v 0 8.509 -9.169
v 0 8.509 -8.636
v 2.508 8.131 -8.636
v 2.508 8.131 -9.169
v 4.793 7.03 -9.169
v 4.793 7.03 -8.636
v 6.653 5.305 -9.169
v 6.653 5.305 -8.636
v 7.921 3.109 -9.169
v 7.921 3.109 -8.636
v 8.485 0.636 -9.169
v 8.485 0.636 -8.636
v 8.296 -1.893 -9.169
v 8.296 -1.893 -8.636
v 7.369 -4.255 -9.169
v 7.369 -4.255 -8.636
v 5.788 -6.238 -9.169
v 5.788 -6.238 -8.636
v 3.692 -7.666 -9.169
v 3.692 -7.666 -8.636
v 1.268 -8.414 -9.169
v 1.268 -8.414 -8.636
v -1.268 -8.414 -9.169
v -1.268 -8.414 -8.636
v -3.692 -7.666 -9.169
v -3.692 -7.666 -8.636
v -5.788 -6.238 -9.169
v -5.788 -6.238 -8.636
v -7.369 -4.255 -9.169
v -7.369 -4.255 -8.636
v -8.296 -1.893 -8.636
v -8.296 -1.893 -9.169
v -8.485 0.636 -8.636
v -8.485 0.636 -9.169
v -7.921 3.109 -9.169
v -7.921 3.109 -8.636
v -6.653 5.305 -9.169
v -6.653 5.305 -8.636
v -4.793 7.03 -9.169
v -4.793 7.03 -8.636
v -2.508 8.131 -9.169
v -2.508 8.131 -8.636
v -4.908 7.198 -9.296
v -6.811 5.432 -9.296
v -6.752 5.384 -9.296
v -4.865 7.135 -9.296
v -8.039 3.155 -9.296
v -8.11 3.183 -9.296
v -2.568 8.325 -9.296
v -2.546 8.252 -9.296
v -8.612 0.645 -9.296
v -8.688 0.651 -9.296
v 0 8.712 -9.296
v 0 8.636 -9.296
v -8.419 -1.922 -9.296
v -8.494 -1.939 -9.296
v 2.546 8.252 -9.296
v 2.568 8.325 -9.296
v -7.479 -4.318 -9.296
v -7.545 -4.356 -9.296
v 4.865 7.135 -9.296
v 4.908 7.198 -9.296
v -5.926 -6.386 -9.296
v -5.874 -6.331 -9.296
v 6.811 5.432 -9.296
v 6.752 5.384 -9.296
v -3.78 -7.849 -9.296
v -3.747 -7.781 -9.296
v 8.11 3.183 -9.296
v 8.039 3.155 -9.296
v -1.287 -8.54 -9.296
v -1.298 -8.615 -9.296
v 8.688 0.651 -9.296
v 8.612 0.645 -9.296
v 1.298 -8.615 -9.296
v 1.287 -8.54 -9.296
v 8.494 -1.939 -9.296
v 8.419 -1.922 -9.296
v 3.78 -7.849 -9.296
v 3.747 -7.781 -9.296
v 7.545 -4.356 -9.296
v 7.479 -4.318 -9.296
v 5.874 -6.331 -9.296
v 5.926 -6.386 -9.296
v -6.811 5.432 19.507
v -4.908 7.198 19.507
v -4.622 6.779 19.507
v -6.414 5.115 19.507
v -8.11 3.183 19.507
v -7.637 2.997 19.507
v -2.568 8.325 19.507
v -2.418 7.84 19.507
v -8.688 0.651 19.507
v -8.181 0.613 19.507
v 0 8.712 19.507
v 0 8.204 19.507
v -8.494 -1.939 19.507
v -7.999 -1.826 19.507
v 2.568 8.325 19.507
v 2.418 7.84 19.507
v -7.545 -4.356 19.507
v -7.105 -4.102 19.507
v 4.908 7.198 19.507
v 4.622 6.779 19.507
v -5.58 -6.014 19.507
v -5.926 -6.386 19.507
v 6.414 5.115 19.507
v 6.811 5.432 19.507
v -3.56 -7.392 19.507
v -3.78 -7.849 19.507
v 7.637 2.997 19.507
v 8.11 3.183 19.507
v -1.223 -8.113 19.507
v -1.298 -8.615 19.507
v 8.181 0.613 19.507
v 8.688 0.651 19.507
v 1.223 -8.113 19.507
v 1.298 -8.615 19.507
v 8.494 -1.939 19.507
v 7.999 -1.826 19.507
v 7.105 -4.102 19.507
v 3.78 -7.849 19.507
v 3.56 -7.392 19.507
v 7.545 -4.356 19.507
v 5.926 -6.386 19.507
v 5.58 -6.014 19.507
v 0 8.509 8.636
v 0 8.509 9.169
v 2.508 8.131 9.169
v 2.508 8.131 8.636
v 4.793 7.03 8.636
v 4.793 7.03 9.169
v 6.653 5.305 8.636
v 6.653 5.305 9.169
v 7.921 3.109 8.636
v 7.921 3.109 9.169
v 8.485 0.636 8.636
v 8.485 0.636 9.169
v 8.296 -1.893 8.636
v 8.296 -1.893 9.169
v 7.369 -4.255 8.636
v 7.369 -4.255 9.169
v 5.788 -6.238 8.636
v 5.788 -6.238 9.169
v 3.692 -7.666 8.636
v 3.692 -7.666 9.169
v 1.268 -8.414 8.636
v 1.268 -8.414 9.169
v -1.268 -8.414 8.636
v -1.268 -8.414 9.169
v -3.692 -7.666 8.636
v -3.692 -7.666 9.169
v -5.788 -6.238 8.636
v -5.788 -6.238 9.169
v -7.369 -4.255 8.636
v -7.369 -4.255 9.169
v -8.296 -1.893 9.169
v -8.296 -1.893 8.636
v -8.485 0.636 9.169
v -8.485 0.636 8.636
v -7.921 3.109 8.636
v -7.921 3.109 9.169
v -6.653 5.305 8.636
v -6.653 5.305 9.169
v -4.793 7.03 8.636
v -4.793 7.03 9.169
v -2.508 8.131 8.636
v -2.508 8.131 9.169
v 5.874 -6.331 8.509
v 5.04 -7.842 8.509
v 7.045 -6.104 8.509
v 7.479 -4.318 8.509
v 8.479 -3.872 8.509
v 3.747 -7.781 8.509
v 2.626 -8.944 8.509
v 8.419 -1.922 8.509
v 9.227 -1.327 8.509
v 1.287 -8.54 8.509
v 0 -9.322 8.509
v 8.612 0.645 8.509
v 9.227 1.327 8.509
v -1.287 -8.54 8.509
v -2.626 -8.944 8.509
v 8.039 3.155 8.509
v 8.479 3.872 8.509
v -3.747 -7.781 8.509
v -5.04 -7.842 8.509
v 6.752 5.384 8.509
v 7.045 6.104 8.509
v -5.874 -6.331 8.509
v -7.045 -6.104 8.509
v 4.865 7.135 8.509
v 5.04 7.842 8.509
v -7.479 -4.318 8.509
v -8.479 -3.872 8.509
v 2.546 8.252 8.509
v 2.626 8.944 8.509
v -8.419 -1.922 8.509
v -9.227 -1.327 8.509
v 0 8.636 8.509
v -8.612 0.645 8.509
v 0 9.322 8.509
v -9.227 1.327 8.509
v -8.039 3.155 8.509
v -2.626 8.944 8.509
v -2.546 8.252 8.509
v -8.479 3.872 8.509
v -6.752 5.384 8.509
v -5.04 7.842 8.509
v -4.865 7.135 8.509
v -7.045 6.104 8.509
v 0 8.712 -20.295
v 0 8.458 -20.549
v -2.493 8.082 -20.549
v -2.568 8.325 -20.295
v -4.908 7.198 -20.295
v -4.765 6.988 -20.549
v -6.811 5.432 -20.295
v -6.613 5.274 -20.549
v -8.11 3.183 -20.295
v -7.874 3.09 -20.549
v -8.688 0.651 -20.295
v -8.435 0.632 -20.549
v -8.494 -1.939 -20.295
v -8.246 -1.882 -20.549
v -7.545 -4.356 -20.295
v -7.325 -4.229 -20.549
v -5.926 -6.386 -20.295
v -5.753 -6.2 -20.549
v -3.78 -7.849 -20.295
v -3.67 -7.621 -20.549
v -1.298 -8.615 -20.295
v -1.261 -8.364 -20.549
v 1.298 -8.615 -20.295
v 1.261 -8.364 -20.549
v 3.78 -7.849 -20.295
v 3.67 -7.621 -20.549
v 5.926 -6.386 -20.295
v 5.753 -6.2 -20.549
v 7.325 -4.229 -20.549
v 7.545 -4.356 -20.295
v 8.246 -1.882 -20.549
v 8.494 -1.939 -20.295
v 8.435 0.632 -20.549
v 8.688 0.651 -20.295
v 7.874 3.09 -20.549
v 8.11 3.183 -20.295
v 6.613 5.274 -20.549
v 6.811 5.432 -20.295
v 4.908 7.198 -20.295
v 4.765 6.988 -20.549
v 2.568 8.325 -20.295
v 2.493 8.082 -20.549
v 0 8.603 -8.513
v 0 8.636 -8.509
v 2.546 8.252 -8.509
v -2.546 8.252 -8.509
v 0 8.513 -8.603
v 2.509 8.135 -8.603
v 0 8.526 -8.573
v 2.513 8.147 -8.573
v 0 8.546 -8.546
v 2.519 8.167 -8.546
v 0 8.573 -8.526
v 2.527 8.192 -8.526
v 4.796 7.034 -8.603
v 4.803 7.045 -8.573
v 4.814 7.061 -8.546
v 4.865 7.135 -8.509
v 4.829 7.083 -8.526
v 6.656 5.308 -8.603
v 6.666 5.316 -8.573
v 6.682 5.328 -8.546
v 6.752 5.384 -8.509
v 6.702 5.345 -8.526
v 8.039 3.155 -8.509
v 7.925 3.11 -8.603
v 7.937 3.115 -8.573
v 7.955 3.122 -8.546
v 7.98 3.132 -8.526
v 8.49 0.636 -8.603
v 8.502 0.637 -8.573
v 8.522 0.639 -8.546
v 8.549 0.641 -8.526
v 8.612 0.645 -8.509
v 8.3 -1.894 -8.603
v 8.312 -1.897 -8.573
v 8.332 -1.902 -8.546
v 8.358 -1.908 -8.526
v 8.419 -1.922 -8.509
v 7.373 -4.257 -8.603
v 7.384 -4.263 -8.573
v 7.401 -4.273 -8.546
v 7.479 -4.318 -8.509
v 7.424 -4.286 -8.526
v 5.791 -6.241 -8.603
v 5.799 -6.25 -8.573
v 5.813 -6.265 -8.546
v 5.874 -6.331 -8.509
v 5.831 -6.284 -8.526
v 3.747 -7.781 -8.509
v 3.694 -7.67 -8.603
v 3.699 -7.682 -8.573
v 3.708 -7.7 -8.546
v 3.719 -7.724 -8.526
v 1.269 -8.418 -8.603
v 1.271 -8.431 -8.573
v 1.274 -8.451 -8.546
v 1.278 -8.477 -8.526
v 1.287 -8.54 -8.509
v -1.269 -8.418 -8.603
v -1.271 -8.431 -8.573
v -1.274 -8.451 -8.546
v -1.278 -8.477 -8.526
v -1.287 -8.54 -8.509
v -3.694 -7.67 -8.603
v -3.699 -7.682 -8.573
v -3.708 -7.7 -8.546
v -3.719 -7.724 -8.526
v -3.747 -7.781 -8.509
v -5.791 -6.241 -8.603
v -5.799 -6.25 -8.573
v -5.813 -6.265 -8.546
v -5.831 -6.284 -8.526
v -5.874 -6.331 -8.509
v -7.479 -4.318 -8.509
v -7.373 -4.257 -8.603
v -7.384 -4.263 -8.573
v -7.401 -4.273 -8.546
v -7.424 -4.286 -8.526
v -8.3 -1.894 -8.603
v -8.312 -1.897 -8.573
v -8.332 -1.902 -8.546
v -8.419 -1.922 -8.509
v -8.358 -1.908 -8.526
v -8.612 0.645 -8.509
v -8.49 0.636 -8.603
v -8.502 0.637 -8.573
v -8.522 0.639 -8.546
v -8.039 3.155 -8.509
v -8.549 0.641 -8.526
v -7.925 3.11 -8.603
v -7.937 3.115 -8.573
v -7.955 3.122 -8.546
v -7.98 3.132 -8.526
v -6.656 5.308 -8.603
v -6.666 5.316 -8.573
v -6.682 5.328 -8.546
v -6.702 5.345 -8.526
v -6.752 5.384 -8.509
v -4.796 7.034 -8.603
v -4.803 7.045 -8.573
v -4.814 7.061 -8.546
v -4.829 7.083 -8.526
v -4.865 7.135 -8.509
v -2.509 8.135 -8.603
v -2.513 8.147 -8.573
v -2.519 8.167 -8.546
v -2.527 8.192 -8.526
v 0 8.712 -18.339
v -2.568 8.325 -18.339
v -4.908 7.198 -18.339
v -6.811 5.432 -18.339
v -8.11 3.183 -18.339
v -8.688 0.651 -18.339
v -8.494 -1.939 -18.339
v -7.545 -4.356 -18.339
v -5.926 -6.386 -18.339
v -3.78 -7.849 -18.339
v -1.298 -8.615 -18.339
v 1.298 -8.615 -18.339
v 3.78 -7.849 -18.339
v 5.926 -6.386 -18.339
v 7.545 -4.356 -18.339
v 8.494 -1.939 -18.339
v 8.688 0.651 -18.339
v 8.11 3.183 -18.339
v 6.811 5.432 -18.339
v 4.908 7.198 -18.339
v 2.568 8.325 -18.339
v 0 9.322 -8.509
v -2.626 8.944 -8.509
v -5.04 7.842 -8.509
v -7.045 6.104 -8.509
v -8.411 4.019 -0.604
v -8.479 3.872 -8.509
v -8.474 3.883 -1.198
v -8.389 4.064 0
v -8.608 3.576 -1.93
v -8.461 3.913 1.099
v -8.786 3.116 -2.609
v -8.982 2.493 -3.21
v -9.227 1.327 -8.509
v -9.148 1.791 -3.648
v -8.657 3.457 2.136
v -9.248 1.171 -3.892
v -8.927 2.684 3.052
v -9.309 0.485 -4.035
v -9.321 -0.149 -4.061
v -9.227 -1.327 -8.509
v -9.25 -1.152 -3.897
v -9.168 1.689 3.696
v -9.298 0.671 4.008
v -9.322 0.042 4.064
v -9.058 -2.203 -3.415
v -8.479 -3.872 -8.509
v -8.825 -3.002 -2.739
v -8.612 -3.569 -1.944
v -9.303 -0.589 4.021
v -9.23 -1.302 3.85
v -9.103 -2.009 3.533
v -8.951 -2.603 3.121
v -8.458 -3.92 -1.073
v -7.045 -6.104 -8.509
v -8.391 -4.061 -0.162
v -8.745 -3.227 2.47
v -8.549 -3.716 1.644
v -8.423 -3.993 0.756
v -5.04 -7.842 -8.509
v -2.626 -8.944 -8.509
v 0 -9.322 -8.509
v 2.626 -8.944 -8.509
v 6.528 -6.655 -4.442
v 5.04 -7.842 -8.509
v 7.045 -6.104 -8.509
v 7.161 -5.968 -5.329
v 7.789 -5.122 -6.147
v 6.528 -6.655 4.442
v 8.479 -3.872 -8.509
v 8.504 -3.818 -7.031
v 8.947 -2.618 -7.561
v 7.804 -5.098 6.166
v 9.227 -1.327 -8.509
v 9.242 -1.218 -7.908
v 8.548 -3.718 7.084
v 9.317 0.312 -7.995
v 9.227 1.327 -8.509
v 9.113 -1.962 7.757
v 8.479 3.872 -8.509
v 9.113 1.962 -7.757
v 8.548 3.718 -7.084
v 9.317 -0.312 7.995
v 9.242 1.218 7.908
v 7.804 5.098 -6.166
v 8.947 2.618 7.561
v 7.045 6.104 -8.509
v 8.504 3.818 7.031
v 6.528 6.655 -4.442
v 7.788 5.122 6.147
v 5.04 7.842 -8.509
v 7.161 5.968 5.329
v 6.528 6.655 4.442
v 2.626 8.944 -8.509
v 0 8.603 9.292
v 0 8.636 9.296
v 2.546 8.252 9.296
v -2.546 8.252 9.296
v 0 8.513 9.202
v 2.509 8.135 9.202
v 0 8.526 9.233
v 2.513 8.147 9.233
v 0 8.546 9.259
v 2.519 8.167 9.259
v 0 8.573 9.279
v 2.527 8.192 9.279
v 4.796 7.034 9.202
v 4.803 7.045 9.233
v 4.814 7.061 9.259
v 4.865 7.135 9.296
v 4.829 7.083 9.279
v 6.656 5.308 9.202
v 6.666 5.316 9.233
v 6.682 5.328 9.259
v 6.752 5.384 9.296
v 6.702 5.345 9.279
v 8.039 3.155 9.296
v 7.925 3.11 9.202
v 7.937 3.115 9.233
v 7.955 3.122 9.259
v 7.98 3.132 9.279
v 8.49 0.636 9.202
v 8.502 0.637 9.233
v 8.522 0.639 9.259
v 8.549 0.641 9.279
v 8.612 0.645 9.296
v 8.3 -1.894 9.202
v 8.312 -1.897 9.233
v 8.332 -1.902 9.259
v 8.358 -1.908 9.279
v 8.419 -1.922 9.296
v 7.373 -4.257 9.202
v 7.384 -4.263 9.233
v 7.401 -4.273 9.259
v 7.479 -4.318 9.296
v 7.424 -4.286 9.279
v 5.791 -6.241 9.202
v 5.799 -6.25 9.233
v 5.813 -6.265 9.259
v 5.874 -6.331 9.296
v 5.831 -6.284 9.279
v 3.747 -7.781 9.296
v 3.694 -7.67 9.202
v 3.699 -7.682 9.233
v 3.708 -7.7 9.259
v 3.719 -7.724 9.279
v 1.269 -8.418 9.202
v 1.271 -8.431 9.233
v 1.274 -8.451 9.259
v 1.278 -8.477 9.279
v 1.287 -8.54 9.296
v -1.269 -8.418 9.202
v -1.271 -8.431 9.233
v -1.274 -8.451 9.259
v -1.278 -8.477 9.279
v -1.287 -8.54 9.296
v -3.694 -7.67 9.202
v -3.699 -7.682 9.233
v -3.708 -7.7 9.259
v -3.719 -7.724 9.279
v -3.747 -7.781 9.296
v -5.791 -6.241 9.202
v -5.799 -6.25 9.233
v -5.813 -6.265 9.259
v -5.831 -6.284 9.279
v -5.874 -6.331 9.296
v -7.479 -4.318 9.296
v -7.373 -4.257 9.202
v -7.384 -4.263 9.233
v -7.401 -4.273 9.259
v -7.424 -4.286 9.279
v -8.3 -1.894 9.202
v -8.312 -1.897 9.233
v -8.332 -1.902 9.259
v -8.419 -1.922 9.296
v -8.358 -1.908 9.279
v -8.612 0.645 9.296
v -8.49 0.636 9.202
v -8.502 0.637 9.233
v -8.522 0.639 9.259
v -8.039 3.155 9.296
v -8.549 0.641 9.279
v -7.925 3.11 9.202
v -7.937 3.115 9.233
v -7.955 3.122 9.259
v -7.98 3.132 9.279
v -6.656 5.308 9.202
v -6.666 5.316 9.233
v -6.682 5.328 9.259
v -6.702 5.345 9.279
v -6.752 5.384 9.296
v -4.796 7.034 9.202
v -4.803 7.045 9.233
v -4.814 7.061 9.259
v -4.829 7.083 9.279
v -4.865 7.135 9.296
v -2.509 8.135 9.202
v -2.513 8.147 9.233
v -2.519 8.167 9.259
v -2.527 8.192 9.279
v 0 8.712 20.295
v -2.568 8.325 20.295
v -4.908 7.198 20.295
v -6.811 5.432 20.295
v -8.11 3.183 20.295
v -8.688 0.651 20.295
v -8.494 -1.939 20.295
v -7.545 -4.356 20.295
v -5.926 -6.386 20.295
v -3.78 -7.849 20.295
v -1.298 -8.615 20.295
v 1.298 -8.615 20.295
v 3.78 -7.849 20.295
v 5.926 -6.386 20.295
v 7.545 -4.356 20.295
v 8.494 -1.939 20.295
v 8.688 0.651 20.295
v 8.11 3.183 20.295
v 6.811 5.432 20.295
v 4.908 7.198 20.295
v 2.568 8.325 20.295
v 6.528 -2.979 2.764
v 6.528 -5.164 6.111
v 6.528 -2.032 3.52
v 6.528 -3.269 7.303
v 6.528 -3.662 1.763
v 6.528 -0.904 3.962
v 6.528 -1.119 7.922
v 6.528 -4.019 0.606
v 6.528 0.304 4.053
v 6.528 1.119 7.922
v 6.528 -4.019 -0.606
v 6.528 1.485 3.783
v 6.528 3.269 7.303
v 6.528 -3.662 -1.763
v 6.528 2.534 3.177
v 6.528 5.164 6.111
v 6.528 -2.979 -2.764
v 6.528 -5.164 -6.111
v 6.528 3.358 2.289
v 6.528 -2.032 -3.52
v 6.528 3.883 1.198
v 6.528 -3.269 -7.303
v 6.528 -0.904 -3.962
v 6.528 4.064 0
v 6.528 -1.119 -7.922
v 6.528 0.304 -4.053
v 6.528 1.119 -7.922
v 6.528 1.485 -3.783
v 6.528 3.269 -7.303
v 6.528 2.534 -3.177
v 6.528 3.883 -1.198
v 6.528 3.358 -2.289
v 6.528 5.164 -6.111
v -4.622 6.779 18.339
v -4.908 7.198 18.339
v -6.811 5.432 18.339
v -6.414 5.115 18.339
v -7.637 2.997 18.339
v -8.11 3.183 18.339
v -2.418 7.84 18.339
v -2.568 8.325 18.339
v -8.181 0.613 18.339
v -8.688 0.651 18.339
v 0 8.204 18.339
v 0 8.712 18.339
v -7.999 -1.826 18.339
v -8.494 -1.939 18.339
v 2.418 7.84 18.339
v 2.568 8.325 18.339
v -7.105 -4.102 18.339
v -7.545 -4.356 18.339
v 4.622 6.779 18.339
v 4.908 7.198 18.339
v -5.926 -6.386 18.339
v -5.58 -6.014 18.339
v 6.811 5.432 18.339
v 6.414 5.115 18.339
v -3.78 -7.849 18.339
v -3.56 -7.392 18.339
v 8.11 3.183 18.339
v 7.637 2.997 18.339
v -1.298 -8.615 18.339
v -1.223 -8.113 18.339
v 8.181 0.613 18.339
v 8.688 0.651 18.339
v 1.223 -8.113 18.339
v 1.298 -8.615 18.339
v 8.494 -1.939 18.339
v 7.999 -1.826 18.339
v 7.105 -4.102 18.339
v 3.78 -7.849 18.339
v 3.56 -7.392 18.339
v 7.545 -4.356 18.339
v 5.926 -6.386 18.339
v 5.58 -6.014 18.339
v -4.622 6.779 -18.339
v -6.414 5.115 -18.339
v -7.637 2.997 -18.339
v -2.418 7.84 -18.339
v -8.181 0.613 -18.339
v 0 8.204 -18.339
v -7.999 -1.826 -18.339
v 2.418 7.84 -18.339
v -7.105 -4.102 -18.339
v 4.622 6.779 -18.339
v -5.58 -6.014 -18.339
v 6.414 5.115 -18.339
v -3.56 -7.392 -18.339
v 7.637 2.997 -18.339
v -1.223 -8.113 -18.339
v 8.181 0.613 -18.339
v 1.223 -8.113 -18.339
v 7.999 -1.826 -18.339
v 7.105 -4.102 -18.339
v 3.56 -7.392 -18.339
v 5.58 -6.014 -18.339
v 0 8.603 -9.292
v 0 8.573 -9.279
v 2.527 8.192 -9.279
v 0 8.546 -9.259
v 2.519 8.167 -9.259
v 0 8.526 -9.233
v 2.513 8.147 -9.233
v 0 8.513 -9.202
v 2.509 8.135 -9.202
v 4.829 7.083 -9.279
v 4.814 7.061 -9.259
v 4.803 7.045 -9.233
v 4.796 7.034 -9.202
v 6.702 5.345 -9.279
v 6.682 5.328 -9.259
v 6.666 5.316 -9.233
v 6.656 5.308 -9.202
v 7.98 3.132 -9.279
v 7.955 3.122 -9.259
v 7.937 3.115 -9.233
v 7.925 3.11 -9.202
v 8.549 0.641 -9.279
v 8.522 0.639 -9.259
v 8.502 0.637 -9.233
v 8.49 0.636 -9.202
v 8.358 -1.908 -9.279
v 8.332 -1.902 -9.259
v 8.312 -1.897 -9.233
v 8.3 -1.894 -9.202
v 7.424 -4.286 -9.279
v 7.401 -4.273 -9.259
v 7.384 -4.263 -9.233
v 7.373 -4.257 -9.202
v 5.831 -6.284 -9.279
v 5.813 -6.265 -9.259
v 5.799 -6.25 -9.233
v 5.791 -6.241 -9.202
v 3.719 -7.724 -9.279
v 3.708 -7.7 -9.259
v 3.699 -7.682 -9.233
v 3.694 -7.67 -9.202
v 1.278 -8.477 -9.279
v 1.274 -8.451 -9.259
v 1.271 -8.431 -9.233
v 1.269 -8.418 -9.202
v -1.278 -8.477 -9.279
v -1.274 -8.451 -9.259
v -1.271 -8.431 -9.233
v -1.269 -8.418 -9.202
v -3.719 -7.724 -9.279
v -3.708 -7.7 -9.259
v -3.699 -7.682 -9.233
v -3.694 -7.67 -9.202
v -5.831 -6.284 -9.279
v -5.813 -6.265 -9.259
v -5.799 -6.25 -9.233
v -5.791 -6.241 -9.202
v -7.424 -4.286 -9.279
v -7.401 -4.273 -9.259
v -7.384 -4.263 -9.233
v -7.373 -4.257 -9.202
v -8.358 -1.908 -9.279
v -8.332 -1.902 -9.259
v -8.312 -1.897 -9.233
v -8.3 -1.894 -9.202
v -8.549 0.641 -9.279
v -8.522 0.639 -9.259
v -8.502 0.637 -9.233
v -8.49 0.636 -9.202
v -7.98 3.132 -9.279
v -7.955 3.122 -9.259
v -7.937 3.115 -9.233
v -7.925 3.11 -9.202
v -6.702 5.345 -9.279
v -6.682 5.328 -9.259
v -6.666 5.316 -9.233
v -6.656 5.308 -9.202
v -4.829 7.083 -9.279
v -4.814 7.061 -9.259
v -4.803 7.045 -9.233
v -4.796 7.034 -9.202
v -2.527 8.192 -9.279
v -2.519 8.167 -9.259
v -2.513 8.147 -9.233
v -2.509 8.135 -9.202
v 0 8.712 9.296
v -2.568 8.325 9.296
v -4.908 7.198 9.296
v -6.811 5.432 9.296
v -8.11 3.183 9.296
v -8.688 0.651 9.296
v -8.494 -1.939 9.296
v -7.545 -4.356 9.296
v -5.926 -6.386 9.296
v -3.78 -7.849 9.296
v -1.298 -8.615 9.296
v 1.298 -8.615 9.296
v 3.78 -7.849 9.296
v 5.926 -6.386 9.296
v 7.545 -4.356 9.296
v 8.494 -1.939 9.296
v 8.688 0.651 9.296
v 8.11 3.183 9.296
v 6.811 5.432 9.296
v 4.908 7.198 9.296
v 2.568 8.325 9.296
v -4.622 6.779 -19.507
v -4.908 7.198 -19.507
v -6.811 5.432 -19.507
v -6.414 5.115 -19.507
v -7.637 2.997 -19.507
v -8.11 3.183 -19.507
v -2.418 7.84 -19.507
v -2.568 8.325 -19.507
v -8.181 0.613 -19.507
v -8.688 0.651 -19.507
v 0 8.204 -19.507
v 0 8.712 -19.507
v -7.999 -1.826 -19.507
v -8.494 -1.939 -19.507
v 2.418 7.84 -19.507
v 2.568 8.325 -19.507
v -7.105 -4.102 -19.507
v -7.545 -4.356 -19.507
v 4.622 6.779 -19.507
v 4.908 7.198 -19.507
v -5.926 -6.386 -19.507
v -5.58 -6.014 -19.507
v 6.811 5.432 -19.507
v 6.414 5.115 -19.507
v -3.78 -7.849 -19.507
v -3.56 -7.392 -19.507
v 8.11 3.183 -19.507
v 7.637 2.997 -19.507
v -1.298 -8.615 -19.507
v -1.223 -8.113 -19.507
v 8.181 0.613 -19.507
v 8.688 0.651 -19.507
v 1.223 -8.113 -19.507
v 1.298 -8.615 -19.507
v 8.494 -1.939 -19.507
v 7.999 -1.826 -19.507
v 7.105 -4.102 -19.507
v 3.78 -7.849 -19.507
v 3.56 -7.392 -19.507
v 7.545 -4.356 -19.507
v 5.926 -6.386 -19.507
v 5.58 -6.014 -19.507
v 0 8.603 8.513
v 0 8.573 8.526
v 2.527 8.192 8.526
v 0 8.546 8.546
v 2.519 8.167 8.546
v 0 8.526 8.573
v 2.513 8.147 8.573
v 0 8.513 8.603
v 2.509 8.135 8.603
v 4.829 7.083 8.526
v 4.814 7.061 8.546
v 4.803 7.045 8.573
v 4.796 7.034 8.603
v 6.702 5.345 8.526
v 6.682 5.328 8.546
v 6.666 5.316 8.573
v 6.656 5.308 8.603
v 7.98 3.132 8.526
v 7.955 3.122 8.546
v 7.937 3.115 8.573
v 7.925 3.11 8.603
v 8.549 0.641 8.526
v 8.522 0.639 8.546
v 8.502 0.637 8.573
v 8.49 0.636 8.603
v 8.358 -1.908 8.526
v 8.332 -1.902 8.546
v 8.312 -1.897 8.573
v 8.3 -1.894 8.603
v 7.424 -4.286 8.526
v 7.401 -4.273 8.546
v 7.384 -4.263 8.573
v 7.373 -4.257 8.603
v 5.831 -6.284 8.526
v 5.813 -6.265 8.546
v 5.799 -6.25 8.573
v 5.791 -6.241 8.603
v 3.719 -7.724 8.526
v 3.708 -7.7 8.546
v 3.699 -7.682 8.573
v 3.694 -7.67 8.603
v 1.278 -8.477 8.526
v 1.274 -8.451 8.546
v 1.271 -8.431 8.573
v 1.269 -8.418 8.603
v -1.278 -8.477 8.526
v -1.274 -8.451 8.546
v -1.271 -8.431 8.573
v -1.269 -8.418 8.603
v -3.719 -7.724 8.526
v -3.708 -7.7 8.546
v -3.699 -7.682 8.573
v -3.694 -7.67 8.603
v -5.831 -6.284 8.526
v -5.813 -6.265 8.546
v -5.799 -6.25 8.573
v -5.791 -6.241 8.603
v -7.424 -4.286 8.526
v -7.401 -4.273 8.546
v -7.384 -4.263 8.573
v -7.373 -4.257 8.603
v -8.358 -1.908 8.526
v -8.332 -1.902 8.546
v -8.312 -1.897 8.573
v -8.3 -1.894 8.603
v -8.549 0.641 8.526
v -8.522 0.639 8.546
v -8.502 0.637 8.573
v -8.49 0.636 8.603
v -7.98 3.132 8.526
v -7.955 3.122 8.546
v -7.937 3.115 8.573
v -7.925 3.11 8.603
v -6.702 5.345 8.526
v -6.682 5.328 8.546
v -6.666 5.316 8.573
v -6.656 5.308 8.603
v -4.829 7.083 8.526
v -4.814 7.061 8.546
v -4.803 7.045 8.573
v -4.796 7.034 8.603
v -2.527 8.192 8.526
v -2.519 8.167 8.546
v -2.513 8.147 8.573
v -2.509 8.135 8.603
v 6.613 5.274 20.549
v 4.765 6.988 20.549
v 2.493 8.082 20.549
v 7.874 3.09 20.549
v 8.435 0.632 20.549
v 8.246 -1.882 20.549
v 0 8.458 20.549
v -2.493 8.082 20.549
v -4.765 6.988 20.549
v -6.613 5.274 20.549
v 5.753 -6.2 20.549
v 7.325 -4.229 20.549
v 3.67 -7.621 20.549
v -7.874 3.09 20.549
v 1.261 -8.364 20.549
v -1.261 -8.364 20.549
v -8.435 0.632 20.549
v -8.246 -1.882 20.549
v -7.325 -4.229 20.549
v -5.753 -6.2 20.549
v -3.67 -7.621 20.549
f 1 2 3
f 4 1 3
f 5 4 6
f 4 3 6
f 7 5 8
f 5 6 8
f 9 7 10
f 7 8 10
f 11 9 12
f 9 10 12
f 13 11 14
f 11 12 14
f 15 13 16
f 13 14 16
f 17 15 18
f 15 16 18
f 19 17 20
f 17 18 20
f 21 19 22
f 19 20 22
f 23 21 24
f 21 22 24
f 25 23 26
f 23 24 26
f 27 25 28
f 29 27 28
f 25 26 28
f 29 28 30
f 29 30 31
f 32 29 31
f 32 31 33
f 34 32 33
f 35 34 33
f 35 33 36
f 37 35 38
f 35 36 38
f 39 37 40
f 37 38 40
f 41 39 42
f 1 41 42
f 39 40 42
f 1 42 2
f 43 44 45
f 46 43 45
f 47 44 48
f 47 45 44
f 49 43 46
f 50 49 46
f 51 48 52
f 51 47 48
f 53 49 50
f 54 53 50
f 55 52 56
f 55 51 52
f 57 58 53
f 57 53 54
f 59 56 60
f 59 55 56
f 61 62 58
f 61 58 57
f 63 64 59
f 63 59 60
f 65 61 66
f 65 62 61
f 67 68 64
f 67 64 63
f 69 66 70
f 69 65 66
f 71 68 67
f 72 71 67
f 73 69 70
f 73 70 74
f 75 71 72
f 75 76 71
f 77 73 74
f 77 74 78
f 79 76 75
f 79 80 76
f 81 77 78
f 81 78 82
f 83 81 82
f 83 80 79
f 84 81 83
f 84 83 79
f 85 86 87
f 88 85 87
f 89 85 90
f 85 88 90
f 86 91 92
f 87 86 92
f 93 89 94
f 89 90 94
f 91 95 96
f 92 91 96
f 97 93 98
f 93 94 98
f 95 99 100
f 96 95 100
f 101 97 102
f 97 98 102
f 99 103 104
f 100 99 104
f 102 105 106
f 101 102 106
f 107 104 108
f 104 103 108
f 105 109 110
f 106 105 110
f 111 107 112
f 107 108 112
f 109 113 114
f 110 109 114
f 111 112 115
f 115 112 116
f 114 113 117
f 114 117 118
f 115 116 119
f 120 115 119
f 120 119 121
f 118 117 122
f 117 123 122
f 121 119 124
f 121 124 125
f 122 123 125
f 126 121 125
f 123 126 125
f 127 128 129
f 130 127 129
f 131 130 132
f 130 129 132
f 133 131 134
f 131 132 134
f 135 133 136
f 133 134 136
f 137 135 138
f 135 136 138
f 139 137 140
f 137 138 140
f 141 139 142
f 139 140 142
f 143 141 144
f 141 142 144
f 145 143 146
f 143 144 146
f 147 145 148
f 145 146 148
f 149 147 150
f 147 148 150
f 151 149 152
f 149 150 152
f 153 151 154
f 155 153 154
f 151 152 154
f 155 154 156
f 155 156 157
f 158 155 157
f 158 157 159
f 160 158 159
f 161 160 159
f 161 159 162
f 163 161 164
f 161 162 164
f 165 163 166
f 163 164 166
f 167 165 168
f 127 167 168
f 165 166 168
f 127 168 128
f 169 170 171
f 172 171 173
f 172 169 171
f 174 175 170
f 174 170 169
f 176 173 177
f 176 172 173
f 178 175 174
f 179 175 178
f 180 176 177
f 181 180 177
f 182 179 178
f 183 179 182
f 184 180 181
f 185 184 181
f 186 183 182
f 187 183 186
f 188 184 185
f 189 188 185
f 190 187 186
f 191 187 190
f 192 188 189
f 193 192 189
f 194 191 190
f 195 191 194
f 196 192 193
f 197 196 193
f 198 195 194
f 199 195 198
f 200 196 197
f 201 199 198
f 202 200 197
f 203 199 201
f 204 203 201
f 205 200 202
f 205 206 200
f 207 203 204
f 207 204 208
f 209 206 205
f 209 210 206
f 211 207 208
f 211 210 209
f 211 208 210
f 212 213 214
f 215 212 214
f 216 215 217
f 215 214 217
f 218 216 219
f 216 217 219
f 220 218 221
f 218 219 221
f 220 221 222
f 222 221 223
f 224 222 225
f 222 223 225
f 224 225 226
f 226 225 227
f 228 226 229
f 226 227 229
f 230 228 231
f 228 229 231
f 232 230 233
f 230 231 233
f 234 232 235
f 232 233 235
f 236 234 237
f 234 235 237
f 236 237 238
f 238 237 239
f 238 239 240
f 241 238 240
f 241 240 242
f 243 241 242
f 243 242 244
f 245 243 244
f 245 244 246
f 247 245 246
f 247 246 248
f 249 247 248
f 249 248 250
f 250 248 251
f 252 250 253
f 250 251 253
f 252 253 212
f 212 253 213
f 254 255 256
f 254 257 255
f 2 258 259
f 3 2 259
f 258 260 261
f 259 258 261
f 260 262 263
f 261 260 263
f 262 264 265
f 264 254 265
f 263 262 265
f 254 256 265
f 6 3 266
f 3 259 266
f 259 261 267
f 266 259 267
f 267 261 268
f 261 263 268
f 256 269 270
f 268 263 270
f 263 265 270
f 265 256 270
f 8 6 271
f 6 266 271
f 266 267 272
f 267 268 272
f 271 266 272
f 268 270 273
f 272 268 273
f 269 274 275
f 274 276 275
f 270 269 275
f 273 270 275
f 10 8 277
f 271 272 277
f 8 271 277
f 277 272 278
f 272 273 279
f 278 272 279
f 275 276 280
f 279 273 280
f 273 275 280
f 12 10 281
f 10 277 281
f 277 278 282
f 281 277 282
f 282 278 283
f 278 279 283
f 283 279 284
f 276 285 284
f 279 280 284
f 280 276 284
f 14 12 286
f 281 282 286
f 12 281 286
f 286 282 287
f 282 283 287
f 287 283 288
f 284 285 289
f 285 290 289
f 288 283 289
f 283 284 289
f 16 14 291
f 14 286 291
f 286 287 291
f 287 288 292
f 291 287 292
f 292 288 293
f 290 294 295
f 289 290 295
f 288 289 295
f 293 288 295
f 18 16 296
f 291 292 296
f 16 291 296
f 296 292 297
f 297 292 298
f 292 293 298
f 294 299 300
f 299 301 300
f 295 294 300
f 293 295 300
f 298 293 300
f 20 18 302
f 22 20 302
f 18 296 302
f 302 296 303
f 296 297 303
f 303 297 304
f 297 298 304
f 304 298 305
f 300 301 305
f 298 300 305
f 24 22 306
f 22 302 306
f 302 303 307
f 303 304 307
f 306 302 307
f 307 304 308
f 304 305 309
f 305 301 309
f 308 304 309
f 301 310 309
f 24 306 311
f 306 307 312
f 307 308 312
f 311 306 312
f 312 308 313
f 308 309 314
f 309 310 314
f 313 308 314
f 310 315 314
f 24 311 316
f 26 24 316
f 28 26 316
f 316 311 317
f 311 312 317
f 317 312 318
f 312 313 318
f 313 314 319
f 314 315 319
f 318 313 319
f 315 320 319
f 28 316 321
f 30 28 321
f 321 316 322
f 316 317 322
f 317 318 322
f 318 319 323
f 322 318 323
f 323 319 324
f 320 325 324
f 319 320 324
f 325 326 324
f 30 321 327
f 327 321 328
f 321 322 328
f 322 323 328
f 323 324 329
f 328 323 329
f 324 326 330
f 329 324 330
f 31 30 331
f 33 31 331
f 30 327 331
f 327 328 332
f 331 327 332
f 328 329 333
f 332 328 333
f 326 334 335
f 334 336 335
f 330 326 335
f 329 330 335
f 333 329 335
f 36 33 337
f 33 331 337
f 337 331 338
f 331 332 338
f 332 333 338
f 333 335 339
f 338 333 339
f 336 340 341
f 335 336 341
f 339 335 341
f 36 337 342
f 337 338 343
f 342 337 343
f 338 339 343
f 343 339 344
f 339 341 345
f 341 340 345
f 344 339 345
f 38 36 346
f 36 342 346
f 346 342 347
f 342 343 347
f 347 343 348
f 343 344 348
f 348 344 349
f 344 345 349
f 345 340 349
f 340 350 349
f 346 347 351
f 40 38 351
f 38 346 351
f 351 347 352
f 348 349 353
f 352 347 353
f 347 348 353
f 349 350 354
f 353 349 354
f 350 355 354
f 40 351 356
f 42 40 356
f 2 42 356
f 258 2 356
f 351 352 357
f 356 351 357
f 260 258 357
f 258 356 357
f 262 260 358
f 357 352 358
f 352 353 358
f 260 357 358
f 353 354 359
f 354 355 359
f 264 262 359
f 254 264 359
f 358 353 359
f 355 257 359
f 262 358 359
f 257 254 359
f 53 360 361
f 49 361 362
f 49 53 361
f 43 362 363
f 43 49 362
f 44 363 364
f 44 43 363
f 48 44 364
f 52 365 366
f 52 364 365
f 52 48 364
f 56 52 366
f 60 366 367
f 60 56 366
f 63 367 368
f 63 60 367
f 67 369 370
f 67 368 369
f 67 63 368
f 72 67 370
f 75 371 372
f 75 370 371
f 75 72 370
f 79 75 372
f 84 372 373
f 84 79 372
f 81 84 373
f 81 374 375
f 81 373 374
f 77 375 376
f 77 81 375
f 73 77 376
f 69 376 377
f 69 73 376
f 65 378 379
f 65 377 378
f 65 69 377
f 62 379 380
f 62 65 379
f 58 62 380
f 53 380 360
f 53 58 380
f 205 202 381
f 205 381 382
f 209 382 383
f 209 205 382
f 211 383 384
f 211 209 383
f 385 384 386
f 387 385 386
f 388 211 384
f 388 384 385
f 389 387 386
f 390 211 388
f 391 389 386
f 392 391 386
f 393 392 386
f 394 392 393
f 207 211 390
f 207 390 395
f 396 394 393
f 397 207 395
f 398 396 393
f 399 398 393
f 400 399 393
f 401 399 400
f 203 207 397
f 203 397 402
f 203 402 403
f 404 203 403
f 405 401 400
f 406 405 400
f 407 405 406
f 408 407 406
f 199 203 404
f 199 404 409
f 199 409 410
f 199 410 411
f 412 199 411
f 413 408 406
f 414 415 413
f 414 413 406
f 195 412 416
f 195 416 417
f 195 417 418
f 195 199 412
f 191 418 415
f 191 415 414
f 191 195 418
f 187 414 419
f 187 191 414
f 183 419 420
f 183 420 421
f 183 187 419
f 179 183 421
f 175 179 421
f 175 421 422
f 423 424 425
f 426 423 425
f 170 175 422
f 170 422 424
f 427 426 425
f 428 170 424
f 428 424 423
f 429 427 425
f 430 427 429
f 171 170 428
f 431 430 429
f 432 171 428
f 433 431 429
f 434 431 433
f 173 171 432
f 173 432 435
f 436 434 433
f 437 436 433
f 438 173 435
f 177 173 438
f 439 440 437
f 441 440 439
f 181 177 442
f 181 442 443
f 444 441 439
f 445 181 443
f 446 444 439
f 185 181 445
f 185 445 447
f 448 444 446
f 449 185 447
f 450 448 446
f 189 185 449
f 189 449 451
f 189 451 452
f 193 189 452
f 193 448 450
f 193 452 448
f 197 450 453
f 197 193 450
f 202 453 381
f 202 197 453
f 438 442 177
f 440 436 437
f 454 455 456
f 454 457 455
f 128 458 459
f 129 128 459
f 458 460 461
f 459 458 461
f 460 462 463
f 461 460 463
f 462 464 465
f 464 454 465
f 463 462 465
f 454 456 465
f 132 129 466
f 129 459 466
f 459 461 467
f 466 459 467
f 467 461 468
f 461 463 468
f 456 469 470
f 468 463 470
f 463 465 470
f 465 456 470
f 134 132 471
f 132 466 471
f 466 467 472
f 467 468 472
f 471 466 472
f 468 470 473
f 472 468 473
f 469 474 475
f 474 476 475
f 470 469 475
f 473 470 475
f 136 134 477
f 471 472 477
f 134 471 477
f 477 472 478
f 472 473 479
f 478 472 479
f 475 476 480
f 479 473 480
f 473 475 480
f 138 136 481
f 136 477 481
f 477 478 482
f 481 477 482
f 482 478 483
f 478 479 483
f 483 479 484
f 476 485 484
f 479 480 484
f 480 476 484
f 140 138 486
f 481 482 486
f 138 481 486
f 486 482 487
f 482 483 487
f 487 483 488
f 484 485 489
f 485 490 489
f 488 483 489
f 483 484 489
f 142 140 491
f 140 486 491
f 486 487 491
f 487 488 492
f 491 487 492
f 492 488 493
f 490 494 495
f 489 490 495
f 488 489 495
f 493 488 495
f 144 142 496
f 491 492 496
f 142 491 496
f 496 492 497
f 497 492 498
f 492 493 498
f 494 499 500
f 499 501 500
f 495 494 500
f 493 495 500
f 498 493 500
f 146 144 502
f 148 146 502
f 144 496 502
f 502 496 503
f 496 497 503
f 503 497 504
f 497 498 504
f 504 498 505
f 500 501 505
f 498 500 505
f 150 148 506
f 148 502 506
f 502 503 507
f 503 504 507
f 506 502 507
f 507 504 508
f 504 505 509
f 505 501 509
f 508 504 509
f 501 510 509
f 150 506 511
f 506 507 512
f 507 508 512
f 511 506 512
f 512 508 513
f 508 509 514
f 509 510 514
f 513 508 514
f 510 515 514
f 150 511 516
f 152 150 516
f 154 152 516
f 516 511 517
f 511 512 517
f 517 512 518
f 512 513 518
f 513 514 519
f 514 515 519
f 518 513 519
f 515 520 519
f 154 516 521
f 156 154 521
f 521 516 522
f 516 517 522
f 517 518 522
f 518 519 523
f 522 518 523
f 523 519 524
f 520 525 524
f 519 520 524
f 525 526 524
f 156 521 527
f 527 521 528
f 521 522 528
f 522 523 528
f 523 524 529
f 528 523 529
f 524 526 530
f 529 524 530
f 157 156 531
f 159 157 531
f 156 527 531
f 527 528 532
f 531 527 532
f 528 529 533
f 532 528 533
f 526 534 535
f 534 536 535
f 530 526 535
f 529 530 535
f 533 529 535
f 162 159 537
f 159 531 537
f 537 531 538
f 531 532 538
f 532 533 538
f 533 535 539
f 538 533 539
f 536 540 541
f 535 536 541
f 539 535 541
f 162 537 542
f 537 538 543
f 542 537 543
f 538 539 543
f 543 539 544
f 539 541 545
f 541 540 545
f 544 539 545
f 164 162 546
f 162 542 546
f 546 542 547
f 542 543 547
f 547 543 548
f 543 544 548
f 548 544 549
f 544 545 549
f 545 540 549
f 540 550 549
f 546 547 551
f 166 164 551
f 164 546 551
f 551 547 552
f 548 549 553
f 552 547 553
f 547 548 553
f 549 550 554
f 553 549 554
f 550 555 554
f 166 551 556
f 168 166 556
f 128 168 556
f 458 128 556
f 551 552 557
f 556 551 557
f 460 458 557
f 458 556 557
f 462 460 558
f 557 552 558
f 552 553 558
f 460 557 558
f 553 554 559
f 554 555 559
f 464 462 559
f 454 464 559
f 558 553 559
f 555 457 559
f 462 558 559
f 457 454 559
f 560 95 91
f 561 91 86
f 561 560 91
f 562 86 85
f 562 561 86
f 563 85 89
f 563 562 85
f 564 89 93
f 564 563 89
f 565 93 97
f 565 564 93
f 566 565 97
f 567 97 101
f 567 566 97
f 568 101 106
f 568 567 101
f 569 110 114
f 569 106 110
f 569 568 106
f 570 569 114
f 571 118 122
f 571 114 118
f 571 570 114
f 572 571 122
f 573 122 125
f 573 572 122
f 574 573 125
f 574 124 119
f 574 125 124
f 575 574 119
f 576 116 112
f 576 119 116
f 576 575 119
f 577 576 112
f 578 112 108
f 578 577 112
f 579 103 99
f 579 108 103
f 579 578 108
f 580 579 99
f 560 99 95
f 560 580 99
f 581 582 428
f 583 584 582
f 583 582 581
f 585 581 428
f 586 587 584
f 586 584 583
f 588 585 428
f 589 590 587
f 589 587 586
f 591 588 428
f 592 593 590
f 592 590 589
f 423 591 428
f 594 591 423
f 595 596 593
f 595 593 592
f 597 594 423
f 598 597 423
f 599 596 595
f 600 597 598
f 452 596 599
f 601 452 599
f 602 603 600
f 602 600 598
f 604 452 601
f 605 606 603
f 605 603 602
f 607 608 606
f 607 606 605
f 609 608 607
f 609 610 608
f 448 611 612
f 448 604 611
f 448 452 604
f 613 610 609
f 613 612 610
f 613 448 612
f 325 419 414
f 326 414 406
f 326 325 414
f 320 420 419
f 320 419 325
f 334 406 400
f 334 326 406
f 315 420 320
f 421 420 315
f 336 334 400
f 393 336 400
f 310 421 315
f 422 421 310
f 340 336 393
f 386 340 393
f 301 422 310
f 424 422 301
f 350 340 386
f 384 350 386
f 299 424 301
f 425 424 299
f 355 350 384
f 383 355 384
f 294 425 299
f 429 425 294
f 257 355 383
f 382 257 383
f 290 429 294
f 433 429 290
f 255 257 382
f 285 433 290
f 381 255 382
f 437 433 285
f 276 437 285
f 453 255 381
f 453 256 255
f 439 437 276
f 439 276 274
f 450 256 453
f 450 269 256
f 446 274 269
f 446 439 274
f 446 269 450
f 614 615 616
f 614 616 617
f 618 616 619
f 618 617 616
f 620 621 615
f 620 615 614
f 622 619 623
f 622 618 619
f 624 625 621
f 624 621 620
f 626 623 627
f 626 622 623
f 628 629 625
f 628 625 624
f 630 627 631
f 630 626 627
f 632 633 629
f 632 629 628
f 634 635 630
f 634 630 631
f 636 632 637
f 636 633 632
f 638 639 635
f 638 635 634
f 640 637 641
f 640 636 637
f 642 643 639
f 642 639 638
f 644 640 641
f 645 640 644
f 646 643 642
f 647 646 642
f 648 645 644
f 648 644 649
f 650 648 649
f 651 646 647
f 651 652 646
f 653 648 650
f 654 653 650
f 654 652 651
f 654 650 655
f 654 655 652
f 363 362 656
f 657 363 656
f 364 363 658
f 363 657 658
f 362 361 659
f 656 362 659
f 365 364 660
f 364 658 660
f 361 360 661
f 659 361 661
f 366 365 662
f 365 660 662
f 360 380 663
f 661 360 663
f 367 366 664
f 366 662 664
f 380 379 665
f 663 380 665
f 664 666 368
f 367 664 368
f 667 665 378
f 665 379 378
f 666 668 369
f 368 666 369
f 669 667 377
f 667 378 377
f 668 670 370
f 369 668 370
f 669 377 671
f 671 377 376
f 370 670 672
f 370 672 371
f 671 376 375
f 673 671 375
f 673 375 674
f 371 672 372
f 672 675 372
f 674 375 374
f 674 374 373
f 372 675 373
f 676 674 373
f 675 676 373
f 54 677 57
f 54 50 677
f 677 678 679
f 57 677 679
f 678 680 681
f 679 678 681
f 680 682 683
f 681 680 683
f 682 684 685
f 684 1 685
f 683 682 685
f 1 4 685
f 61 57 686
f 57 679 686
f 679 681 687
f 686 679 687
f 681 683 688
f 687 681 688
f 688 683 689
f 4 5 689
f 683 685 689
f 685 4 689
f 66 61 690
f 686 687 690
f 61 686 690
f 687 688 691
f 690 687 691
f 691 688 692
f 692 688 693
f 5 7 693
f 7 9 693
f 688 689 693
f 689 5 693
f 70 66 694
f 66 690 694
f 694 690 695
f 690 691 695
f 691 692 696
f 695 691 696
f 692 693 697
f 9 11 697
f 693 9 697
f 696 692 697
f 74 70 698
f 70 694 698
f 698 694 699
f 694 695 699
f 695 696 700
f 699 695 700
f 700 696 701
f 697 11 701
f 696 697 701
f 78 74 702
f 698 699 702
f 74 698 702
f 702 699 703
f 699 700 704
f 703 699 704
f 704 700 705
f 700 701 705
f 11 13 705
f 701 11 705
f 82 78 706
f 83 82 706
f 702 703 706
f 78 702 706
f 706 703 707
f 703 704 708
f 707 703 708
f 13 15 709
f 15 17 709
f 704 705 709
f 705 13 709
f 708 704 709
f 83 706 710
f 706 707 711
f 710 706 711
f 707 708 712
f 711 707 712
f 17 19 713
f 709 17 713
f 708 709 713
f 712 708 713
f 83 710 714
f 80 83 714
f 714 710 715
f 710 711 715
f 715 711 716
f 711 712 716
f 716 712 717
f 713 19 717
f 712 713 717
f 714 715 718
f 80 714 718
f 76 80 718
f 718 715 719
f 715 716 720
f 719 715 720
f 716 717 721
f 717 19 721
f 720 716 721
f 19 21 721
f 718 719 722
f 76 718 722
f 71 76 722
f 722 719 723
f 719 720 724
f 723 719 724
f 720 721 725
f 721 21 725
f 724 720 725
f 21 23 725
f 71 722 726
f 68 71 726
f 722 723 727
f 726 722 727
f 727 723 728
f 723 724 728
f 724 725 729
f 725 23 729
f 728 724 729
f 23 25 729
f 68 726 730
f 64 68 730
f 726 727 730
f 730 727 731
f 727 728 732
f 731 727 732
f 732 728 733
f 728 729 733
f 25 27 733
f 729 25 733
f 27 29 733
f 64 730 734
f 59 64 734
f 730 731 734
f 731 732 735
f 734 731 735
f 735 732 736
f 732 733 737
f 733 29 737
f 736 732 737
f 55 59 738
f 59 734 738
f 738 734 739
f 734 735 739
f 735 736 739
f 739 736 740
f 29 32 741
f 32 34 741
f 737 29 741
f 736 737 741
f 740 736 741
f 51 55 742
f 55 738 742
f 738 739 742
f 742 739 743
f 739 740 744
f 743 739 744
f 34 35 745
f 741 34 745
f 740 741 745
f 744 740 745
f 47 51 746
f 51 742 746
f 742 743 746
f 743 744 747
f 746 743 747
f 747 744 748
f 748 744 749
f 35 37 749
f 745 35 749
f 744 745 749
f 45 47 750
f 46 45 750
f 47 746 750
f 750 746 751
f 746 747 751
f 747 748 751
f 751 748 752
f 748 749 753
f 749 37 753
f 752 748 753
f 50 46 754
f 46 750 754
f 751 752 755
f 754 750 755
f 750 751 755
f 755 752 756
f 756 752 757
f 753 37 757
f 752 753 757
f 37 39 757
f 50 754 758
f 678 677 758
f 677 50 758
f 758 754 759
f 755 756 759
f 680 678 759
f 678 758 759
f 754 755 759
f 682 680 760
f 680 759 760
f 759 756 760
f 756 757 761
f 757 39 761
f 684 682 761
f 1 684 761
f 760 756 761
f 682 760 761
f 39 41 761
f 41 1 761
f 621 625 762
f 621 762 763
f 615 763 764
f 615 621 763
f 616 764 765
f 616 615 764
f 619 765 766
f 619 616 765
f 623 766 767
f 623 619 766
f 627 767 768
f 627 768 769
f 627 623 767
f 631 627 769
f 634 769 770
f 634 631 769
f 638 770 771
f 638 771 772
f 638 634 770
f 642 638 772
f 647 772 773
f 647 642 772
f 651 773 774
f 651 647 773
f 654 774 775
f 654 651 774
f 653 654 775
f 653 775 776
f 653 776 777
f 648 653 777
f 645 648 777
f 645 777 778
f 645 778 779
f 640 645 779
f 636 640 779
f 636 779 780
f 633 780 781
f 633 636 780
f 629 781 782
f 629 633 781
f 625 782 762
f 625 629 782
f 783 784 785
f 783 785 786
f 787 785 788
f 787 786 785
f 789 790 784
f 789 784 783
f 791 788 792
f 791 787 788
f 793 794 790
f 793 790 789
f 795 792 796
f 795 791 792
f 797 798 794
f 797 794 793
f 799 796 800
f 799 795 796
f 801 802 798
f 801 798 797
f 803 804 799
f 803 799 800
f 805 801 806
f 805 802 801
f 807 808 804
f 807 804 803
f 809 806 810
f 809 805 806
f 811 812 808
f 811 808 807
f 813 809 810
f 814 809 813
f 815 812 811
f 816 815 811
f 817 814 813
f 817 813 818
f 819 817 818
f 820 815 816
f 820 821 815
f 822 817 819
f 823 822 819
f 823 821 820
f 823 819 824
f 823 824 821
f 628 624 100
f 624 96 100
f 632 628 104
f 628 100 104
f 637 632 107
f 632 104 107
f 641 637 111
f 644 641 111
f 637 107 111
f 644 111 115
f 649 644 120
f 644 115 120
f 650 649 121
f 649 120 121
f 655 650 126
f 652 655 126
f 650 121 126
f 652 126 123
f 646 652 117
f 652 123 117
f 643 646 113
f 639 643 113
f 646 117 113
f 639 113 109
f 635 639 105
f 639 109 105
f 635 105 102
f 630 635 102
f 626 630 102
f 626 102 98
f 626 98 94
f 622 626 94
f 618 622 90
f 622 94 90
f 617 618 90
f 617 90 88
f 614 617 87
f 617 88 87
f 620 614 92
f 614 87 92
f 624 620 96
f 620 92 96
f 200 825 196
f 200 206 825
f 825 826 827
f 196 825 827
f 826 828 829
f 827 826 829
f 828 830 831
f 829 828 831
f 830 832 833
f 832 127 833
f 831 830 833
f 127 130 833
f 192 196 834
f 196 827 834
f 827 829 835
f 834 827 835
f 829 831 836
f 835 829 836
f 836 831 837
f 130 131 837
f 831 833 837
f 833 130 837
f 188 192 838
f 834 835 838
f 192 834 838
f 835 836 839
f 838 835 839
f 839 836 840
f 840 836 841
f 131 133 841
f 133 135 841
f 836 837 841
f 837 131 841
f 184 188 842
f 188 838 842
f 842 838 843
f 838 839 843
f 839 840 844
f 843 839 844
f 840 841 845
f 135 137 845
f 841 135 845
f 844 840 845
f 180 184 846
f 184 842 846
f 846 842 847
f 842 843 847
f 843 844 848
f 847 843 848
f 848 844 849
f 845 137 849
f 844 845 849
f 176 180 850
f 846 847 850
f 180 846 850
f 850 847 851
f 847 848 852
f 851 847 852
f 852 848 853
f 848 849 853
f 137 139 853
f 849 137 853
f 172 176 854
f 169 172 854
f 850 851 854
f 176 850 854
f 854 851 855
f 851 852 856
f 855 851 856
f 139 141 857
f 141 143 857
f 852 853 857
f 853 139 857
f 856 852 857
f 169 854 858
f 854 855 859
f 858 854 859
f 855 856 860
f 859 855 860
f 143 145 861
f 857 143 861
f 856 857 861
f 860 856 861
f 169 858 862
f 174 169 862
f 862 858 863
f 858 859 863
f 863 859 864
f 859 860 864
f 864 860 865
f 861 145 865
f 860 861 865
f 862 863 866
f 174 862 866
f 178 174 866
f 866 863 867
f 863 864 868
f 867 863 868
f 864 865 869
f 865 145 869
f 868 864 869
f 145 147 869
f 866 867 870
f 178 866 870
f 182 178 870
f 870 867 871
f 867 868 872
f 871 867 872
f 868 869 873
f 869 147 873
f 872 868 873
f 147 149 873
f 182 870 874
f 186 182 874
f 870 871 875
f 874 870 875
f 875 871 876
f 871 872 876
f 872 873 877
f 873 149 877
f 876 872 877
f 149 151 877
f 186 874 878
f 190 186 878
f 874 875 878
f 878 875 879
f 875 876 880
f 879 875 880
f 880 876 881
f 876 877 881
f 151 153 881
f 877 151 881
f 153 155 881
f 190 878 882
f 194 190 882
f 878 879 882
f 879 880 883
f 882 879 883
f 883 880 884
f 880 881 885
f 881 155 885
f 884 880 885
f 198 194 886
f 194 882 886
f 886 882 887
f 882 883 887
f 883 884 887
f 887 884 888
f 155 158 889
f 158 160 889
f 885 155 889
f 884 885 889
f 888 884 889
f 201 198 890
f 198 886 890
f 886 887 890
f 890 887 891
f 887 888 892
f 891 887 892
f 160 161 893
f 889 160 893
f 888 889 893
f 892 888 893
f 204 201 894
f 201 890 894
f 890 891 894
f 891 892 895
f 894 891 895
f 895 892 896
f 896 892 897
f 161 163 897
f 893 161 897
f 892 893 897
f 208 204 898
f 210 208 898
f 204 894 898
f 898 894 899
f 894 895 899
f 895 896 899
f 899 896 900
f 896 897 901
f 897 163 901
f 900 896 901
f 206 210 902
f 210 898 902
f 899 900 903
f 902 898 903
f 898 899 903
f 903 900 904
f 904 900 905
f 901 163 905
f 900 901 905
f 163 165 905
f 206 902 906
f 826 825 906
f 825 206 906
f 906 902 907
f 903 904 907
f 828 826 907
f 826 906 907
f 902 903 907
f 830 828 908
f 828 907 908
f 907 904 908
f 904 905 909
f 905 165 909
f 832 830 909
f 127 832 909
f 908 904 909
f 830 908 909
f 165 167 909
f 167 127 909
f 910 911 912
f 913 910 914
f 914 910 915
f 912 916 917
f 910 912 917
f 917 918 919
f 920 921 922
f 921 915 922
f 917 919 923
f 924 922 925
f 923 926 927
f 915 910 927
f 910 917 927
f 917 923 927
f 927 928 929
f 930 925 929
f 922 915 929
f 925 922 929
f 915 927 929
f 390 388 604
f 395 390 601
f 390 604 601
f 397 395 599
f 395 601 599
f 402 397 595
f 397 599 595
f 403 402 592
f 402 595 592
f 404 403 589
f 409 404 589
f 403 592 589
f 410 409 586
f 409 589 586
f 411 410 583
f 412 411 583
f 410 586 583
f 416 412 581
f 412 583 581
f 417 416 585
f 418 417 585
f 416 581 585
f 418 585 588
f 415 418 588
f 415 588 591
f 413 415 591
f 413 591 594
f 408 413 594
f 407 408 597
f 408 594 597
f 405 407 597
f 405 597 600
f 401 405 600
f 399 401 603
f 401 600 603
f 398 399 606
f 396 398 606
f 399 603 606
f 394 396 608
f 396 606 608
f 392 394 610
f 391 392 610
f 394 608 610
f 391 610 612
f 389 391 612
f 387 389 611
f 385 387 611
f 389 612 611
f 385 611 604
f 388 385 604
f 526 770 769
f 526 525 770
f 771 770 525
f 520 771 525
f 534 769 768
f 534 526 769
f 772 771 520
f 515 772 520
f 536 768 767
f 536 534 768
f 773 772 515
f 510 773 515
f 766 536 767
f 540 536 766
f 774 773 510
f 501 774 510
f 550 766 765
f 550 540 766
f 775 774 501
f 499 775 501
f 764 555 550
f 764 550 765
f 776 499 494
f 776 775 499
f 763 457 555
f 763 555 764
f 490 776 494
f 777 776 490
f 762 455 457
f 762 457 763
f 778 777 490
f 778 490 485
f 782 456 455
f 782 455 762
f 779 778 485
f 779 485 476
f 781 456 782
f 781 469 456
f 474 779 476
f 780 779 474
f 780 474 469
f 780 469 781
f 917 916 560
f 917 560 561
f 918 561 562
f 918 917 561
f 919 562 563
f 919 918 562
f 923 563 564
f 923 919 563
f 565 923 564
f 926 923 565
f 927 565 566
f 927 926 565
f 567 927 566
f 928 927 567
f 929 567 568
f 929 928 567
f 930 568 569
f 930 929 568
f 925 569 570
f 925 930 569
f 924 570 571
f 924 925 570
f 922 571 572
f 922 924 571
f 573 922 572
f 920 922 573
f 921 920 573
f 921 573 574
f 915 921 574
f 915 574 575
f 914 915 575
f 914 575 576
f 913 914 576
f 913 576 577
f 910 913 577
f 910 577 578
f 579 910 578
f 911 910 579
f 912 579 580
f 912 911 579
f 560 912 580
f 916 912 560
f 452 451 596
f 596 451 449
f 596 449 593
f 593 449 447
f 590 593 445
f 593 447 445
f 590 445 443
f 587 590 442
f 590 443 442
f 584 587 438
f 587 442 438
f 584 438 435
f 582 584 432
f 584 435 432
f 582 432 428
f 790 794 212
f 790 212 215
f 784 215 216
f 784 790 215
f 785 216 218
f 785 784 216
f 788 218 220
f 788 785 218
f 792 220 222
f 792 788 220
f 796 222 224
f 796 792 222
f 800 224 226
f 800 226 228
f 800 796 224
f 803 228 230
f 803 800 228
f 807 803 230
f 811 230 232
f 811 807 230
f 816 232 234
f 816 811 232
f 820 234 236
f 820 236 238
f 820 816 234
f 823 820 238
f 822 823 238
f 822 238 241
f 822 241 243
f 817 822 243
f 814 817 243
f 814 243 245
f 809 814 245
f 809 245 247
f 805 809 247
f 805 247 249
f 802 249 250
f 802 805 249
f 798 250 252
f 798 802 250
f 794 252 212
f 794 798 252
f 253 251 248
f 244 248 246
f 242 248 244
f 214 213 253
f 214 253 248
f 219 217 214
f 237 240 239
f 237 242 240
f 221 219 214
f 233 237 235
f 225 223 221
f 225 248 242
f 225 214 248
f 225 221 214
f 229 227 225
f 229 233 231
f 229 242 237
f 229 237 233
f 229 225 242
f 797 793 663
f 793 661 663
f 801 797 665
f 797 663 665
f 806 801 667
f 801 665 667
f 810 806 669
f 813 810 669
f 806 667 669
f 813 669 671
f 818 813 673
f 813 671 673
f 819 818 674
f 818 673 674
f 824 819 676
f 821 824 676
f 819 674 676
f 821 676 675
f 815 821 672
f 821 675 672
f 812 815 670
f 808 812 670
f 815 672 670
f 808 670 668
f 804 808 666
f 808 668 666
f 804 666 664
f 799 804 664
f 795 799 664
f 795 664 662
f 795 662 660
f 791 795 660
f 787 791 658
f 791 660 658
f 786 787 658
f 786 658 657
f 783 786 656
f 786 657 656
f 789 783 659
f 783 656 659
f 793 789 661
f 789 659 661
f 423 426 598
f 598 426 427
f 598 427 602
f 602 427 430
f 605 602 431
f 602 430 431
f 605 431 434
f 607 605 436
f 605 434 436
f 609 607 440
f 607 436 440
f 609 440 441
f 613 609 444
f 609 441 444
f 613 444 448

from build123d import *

# Parameters (mm, degrees)
F0_W          = 8.7122
F0_H          = 8.509
F0_W_2        = 0.6096
F0_H_2        = 12.0396
F2_R          = 4.064
F3_DEPTH      = 9.3228
F3_DEPTH_BACK = 9.3228
F4_W          = 2.794
F4_H          = 8.001
F6_W          = 0.2032
F6_H          = 0.7874
F6_W_2        = 6.1468
F8_W          = 0.508
F8_H          = 1.1684
F10_R         = 0.127
F11_SIZE      = 0.254


with BuildPart() as f1:
    # F0 (on Right) → F1 (revolve)
    with BuildSketch(Plane.YZ):
        with Locations((4.3561, 4.2545)):
            Rectangle(F0_W, F0_H)
        with Locations((4.3561, -4.2545)):
            Rectangle(F0_W, F0_H)
        with Locations((9.017, 4.2545)):
            Rectangle(F0_W_2, F0_H)
        with Locations((9.017, -4.2545)):
            Rectangle(F0_W_2, F0_H)
        with Locations((4.3561, -14.5288)):
            Rectangle(F0_W, F0_H_2)
        with Locations((4.3561, 14.5288)):
            Rectangle(F0_W, F0_H_2)
    revolve(axis=Axis((0, 0, 10.2743), (0, 0, 1)))

    # F2 (on Right) → F3 (cut, two sides)
    with BuildSketch(Plane.YZ) as f3_sk:
        Circle(F2_R)
    extrude(amount=-F3_DEPTH, mode=Mode.SUBTRACT)
    extrude(f3_sk.sketch, amount=F3_DEPTH_BACK, mode=Mode.SUBTRACT)

    # F4 (on Front) → F5 (revolve, cut)
    with BuildSketch(Plane.XZ):
        with Locations((7.9248, -4.0005)):
            Rectangle(F4_W, F4_H)
    revolve(axis=Axis((12.8778, 0, 0), (1, 0, 0)), mode=Mode.SUBTRACT)

    # F6 (on Right) → F7 (revolve, cut)
    with BuildSketch(Plane.YZ):
        Polygon((14.859, -8.509), (9.3218, -8.509), (8.7122, -8.509), (8.7122, -9.2964), (14.859, -9.2964), align=None)
        with Locations((8.6106, -8.9027)):
            Rectangle(F6_W, F6_H)
        with Locations((8.6106, 8.9027)):
            Rectangle(F6_W, F6_H)
        with Locations((11.7856, 8.9027)):
            Rectangle(F6_W_2, F6_H)
    revolve(axis=Axis((0, 0, -10.2471997961), (0, 0, -1)), mode=Mode.SUBTRACT)

    # F8 (on Right) → F9 (revolve, cut)
    with BuildSketch(Plane.YZ):
        with Locations((8.4582, -18.923)):
            Rectangle(F8_W, F8_H)
        with Locations((8.4582, 18.923)):
            Rectangle(F8_W, F8_H)
    revolve(axis=Axis((0, 0, -10.2743), (0, 0, -1)), mode=Mode.SUBTRACT)

    # F10
    f10_edges = [f1.edges().sort_by_distance(p)[0] for p in [
        (0, -8.509, -8.509),
        (0, -8.509, -9.2964),
        (0, -8.509, 8.509),
        (0, -8.509, 9.2964),
    ]]
    fillet(f10_edges, radius=F10_R)

    # F11
    f11_edges = [f1.edges().sort_by_distance(p)[0] for p in [
        (0, -8.7122, 20.5486),
        (0, -8.7122, -20.5486),
    ]]
    chamfer(f11_edges, length=F11_SIZE)


solid = f1.part
